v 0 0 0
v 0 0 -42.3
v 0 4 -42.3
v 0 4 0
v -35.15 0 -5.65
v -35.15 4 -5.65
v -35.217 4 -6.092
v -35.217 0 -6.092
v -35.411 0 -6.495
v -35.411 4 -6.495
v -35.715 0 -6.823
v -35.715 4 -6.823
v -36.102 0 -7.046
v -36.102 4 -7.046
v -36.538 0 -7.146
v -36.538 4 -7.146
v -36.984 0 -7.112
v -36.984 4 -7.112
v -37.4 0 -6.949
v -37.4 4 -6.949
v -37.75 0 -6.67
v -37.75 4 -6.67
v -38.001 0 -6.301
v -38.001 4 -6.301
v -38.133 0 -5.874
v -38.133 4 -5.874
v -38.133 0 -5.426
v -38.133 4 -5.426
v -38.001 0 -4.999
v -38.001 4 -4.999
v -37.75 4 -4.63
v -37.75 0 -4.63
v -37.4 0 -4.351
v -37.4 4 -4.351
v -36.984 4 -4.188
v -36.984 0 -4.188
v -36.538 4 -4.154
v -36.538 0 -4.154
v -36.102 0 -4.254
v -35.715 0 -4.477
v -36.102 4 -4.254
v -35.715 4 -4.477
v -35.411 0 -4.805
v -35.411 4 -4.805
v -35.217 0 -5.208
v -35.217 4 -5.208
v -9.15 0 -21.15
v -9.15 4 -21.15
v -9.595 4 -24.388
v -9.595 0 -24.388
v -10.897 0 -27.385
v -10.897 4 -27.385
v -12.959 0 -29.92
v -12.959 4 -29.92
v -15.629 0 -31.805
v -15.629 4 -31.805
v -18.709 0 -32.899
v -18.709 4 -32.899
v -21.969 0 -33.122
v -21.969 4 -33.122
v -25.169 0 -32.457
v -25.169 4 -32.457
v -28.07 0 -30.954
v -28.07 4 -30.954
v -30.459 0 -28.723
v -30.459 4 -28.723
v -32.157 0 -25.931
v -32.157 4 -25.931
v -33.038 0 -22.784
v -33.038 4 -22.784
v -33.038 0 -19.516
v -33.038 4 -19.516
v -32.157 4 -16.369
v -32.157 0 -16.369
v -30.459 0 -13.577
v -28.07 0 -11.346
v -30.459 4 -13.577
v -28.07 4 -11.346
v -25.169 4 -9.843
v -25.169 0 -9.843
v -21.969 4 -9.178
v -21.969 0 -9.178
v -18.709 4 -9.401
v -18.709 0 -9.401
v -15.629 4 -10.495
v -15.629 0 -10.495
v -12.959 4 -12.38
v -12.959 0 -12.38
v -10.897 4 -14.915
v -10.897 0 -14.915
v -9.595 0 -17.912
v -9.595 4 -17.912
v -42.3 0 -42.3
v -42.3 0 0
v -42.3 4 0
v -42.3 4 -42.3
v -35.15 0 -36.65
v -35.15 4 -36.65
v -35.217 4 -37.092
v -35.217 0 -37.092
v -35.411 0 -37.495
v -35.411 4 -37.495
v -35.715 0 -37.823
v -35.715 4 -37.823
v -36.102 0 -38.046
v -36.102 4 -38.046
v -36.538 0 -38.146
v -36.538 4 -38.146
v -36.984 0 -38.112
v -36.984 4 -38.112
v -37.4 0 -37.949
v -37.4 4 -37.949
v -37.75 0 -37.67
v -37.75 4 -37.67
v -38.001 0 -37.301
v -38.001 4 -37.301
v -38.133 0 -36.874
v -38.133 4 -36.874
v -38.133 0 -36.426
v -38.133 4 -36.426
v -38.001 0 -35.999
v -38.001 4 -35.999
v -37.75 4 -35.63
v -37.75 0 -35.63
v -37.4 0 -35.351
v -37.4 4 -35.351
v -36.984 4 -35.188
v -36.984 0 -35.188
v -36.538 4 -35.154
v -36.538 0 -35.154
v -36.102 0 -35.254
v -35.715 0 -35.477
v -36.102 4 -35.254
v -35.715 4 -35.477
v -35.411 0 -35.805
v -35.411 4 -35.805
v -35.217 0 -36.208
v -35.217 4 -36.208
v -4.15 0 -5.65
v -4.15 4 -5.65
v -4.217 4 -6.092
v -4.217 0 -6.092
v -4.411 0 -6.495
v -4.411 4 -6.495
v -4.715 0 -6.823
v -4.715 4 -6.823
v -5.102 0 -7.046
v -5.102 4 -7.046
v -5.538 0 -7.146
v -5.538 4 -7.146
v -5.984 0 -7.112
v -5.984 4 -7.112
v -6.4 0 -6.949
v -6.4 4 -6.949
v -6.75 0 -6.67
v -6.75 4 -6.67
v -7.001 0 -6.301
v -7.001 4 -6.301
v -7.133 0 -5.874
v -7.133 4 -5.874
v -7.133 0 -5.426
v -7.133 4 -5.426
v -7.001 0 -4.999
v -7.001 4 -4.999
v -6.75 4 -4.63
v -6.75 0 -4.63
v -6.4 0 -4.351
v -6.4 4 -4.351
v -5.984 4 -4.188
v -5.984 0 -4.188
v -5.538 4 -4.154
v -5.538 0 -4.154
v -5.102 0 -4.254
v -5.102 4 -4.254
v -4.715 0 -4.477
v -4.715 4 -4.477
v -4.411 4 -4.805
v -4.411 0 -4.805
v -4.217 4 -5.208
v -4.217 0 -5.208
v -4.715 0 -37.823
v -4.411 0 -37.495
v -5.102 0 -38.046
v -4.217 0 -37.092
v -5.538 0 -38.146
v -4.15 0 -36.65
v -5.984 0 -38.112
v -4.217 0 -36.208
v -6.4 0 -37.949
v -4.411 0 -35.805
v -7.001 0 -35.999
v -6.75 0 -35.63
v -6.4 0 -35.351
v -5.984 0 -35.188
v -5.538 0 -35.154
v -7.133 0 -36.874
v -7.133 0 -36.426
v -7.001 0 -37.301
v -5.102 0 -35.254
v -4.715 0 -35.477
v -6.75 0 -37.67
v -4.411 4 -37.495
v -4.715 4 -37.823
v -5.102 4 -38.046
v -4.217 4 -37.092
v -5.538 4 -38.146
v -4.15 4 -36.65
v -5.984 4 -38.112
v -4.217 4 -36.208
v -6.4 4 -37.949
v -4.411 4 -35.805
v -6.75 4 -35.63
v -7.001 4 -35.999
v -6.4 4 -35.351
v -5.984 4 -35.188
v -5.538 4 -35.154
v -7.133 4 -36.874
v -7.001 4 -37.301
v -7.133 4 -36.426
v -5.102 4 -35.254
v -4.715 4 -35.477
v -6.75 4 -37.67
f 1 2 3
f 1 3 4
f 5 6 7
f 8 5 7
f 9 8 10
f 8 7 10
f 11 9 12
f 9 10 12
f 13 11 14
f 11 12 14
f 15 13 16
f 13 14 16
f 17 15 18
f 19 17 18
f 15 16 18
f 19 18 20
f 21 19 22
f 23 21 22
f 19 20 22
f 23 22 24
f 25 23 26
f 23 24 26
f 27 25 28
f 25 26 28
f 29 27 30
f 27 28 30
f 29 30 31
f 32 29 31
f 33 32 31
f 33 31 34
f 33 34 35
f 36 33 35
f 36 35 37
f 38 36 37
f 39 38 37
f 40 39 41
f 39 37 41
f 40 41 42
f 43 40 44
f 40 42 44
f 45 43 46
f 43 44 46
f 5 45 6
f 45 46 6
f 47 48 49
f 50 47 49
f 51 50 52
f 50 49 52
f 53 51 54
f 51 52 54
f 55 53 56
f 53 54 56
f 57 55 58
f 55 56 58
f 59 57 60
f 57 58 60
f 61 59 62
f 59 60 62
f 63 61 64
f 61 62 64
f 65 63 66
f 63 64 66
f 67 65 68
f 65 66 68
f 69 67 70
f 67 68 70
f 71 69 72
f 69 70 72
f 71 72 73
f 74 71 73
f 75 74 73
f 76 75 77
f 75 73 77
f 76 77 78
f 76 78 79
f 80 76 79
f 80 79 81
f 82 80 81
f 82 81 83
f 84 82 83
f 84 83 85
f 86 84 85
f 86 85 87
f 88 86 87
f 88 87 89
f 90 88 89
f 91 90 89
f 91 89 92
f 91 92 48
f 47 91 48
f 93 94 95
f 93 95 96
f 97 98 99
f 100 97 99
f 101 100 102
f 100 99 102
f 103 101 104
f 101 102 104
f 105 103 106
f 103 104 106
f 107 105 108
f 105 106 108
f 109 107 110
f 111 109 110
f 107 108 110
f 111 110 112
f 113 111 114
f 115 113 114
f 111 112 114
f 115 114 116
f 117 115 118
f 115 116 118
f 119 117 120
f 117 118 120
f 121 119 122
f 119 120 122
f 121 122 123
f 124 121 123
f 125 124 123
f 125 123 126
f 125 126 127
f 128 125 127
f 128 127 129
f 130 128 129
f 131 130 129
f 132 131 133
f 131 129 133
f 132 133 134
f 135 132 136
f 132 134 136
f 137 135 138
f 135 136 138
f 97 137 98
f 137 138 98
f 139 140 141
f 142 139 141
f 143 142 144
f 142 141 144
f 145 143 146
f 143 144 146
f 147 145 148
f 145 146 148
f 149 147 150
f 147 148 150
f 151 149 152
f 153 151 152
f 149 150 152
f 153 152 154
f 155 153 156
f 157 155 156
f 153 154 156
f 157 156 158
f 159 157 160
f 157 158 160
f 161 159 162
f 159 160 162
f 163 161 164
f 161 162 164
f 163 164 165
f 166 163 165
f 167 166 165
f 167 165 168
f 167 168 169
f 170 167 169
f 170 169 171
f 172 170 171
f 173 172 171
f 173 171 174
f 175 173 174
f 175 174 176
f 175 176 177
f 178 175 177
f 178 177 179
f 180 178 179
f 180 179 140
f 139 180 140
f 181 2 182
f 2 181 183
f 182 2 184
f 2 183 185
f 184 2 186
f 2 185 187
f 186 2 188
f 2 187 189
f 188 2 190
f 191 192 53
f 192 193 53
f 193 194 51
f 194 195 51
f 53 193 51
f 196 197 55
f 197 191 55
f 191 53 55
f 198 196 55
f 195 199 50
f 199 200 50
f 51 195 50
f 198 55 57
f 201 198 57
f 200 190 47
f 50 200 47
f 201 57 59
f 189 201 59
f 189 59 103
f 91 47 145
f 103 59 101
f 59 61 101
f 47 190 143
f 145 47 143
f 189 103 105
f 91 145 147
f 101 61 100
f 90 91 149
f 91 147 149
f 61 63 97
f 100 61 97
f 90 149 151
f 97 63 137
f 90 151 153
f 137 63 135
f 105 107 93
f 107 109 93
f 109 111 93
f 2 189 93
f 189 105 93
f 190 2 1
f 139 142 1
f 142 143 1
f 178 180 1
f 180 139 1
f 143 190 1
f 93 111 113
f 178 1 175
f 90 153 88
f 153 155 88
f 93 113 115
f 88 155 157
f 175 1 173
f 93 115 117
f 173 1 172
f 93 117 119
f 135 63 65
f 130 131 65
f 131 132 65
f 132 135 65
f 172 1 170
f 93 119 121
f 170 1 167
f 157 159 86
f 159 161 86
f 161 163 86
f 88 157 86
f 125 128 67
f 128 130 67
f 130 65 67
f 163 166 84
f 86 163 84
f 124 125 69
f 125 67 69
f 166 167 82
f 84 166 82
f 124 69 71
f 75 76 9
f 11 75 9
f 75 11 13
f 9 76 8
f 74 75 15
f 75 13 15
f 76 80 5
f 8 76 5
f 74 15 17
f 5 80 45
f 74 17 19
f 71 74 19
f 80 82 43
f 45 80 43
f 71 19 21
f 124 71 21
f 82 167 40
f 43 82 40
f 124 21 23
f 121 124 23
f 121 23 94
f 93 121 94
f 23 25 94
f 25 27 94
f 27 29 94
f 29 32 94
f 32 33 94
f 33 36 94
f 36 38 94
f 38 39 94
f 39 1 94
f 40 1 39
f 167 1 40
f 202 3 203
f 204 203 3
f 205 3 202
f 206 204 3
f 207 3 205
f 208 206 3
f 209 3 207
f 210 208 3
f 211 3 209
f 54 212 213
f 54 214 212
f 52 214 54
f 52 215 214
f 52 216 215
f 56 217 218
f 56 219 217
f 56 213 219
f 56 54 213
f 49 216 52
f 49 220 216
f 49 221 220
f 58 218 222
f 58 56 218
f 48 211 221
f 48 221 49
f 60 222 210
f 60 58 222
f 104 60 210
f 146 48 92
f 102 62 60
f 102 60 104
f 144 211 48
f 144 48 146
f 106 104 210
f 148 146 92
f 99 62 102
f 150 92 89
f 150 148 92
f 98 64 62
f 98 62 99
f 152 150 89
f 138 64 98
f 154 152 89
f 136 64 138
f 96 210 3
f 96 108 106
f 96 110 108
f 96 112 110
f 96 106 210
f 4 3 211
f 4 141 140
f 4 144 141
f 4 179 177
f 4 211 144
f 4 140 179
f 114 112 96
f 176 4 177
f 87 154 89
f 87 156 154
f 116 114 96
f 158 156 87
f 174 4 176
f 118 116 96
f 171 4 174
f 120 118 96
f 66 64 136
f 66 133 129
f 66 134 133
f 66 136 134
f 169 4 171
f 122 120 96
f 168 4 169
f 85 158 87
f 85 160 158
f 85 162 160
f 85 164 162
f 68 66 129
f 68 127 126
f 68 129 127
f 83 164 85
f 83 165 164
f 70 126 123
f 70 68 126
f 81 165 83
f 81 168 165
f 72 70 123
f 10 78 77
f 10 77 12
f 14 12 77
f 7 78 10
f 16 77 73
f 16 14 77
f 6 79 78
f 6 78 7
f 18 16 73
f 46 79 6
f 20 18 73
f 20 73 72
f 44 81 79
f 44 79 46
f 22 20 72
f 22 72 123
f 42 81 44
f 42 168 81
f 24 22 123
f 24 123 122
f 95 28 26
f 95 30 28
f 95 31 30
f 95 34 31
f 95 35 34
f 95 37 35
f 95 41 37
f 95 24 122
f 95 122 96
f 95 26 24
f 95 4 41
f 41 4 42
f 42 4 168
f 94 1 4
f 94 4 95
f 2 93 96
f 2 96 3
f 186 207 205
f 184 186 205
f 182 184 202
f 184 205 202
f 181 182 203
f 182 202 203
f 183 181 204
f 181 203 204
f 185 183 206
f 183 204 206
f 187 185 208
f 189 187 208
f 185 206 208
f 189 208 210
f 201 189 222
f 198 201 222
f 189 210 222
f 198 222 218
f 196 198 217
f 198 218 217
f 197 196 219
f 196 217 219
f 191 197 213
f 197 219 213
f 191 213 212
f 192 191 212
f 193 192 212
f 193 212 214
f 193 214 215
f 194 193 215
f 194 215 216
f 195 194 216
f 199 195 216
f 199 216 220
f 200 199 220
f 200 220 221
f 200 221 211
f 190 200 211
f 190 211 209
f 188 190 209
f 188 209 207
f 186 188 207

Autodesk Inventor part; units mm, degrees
ref_plane "YZ Plane" through (0, 0, 0) normal (1, 0, 0) x (0, 1, 0)
ref_plane "XZ Plane" through (0, 0, 0) normal (0, 1, 0) x (-1, 0, 0)
ref_plane "XY Plane" through (0, 0, 0) normal (0, 0, 1) x (1, 0, 0)
sketch "Sketch1" plane through (0, 0, 0) normal (0, 1, 0) x (-1, 0, 0)
  line L0 (0, 0) -> (42.3, 0)
  line L1 (42.3, 0) -> (42.3, -42.3)
  line L2 (42.3, -42.3) -> (0, -42.3)
  line L3 (0, -42.3) -> (0, 0)
  dimension "d0" = 42.3
extrude "Extrusion1" add sketch "Sketch1" along normal blind 4
sketch "Sketch2" plane through (0, 4, 0) normal (0, 1, 0) x (1, 0, 0)
  line L0 (0, 42.3) -> (-42.3, 42.3) projected
  line L1 (-42.3, 42.3) -> (-42.3, 0) projected
  circle A0 centre (-36.65, 5.65) radius 1.5
  circle A1 centre (-5.65, 5.65) radius 1.5
  circle A2 centre (-36.65, 36.65) radius 1.5
  circle A3 centre (-5.65, 36.65) radius 1.5
  dimension "d3" = 3
  dimension "d5" = 31
  dimension "d6" = 31
  dimension "d7" = 5.65
  dimension "d8" = 5.65
extrude "Extrusion2" cut sketch "Sketch2" against normal up to next
sketch "Sketch3" plane through (0, 4, 0) normal (0, 1, 0) x (1, 0, 0)
  line L0 (-42.3, 0) -> (0, 0) projected
  line L1 (-42.3, 42.3) -> (-42.3, 0) projected
  circle A0 centre (-21.15, 21.15) radius 12
  dimension "d11" = 24
  dimension "d12" = 21.15
  dimension "d13" = 21.15
extrude "Extrusion3" cut sketch "Sketch3" against normal up to next
properties part number "ZMotorMount"
